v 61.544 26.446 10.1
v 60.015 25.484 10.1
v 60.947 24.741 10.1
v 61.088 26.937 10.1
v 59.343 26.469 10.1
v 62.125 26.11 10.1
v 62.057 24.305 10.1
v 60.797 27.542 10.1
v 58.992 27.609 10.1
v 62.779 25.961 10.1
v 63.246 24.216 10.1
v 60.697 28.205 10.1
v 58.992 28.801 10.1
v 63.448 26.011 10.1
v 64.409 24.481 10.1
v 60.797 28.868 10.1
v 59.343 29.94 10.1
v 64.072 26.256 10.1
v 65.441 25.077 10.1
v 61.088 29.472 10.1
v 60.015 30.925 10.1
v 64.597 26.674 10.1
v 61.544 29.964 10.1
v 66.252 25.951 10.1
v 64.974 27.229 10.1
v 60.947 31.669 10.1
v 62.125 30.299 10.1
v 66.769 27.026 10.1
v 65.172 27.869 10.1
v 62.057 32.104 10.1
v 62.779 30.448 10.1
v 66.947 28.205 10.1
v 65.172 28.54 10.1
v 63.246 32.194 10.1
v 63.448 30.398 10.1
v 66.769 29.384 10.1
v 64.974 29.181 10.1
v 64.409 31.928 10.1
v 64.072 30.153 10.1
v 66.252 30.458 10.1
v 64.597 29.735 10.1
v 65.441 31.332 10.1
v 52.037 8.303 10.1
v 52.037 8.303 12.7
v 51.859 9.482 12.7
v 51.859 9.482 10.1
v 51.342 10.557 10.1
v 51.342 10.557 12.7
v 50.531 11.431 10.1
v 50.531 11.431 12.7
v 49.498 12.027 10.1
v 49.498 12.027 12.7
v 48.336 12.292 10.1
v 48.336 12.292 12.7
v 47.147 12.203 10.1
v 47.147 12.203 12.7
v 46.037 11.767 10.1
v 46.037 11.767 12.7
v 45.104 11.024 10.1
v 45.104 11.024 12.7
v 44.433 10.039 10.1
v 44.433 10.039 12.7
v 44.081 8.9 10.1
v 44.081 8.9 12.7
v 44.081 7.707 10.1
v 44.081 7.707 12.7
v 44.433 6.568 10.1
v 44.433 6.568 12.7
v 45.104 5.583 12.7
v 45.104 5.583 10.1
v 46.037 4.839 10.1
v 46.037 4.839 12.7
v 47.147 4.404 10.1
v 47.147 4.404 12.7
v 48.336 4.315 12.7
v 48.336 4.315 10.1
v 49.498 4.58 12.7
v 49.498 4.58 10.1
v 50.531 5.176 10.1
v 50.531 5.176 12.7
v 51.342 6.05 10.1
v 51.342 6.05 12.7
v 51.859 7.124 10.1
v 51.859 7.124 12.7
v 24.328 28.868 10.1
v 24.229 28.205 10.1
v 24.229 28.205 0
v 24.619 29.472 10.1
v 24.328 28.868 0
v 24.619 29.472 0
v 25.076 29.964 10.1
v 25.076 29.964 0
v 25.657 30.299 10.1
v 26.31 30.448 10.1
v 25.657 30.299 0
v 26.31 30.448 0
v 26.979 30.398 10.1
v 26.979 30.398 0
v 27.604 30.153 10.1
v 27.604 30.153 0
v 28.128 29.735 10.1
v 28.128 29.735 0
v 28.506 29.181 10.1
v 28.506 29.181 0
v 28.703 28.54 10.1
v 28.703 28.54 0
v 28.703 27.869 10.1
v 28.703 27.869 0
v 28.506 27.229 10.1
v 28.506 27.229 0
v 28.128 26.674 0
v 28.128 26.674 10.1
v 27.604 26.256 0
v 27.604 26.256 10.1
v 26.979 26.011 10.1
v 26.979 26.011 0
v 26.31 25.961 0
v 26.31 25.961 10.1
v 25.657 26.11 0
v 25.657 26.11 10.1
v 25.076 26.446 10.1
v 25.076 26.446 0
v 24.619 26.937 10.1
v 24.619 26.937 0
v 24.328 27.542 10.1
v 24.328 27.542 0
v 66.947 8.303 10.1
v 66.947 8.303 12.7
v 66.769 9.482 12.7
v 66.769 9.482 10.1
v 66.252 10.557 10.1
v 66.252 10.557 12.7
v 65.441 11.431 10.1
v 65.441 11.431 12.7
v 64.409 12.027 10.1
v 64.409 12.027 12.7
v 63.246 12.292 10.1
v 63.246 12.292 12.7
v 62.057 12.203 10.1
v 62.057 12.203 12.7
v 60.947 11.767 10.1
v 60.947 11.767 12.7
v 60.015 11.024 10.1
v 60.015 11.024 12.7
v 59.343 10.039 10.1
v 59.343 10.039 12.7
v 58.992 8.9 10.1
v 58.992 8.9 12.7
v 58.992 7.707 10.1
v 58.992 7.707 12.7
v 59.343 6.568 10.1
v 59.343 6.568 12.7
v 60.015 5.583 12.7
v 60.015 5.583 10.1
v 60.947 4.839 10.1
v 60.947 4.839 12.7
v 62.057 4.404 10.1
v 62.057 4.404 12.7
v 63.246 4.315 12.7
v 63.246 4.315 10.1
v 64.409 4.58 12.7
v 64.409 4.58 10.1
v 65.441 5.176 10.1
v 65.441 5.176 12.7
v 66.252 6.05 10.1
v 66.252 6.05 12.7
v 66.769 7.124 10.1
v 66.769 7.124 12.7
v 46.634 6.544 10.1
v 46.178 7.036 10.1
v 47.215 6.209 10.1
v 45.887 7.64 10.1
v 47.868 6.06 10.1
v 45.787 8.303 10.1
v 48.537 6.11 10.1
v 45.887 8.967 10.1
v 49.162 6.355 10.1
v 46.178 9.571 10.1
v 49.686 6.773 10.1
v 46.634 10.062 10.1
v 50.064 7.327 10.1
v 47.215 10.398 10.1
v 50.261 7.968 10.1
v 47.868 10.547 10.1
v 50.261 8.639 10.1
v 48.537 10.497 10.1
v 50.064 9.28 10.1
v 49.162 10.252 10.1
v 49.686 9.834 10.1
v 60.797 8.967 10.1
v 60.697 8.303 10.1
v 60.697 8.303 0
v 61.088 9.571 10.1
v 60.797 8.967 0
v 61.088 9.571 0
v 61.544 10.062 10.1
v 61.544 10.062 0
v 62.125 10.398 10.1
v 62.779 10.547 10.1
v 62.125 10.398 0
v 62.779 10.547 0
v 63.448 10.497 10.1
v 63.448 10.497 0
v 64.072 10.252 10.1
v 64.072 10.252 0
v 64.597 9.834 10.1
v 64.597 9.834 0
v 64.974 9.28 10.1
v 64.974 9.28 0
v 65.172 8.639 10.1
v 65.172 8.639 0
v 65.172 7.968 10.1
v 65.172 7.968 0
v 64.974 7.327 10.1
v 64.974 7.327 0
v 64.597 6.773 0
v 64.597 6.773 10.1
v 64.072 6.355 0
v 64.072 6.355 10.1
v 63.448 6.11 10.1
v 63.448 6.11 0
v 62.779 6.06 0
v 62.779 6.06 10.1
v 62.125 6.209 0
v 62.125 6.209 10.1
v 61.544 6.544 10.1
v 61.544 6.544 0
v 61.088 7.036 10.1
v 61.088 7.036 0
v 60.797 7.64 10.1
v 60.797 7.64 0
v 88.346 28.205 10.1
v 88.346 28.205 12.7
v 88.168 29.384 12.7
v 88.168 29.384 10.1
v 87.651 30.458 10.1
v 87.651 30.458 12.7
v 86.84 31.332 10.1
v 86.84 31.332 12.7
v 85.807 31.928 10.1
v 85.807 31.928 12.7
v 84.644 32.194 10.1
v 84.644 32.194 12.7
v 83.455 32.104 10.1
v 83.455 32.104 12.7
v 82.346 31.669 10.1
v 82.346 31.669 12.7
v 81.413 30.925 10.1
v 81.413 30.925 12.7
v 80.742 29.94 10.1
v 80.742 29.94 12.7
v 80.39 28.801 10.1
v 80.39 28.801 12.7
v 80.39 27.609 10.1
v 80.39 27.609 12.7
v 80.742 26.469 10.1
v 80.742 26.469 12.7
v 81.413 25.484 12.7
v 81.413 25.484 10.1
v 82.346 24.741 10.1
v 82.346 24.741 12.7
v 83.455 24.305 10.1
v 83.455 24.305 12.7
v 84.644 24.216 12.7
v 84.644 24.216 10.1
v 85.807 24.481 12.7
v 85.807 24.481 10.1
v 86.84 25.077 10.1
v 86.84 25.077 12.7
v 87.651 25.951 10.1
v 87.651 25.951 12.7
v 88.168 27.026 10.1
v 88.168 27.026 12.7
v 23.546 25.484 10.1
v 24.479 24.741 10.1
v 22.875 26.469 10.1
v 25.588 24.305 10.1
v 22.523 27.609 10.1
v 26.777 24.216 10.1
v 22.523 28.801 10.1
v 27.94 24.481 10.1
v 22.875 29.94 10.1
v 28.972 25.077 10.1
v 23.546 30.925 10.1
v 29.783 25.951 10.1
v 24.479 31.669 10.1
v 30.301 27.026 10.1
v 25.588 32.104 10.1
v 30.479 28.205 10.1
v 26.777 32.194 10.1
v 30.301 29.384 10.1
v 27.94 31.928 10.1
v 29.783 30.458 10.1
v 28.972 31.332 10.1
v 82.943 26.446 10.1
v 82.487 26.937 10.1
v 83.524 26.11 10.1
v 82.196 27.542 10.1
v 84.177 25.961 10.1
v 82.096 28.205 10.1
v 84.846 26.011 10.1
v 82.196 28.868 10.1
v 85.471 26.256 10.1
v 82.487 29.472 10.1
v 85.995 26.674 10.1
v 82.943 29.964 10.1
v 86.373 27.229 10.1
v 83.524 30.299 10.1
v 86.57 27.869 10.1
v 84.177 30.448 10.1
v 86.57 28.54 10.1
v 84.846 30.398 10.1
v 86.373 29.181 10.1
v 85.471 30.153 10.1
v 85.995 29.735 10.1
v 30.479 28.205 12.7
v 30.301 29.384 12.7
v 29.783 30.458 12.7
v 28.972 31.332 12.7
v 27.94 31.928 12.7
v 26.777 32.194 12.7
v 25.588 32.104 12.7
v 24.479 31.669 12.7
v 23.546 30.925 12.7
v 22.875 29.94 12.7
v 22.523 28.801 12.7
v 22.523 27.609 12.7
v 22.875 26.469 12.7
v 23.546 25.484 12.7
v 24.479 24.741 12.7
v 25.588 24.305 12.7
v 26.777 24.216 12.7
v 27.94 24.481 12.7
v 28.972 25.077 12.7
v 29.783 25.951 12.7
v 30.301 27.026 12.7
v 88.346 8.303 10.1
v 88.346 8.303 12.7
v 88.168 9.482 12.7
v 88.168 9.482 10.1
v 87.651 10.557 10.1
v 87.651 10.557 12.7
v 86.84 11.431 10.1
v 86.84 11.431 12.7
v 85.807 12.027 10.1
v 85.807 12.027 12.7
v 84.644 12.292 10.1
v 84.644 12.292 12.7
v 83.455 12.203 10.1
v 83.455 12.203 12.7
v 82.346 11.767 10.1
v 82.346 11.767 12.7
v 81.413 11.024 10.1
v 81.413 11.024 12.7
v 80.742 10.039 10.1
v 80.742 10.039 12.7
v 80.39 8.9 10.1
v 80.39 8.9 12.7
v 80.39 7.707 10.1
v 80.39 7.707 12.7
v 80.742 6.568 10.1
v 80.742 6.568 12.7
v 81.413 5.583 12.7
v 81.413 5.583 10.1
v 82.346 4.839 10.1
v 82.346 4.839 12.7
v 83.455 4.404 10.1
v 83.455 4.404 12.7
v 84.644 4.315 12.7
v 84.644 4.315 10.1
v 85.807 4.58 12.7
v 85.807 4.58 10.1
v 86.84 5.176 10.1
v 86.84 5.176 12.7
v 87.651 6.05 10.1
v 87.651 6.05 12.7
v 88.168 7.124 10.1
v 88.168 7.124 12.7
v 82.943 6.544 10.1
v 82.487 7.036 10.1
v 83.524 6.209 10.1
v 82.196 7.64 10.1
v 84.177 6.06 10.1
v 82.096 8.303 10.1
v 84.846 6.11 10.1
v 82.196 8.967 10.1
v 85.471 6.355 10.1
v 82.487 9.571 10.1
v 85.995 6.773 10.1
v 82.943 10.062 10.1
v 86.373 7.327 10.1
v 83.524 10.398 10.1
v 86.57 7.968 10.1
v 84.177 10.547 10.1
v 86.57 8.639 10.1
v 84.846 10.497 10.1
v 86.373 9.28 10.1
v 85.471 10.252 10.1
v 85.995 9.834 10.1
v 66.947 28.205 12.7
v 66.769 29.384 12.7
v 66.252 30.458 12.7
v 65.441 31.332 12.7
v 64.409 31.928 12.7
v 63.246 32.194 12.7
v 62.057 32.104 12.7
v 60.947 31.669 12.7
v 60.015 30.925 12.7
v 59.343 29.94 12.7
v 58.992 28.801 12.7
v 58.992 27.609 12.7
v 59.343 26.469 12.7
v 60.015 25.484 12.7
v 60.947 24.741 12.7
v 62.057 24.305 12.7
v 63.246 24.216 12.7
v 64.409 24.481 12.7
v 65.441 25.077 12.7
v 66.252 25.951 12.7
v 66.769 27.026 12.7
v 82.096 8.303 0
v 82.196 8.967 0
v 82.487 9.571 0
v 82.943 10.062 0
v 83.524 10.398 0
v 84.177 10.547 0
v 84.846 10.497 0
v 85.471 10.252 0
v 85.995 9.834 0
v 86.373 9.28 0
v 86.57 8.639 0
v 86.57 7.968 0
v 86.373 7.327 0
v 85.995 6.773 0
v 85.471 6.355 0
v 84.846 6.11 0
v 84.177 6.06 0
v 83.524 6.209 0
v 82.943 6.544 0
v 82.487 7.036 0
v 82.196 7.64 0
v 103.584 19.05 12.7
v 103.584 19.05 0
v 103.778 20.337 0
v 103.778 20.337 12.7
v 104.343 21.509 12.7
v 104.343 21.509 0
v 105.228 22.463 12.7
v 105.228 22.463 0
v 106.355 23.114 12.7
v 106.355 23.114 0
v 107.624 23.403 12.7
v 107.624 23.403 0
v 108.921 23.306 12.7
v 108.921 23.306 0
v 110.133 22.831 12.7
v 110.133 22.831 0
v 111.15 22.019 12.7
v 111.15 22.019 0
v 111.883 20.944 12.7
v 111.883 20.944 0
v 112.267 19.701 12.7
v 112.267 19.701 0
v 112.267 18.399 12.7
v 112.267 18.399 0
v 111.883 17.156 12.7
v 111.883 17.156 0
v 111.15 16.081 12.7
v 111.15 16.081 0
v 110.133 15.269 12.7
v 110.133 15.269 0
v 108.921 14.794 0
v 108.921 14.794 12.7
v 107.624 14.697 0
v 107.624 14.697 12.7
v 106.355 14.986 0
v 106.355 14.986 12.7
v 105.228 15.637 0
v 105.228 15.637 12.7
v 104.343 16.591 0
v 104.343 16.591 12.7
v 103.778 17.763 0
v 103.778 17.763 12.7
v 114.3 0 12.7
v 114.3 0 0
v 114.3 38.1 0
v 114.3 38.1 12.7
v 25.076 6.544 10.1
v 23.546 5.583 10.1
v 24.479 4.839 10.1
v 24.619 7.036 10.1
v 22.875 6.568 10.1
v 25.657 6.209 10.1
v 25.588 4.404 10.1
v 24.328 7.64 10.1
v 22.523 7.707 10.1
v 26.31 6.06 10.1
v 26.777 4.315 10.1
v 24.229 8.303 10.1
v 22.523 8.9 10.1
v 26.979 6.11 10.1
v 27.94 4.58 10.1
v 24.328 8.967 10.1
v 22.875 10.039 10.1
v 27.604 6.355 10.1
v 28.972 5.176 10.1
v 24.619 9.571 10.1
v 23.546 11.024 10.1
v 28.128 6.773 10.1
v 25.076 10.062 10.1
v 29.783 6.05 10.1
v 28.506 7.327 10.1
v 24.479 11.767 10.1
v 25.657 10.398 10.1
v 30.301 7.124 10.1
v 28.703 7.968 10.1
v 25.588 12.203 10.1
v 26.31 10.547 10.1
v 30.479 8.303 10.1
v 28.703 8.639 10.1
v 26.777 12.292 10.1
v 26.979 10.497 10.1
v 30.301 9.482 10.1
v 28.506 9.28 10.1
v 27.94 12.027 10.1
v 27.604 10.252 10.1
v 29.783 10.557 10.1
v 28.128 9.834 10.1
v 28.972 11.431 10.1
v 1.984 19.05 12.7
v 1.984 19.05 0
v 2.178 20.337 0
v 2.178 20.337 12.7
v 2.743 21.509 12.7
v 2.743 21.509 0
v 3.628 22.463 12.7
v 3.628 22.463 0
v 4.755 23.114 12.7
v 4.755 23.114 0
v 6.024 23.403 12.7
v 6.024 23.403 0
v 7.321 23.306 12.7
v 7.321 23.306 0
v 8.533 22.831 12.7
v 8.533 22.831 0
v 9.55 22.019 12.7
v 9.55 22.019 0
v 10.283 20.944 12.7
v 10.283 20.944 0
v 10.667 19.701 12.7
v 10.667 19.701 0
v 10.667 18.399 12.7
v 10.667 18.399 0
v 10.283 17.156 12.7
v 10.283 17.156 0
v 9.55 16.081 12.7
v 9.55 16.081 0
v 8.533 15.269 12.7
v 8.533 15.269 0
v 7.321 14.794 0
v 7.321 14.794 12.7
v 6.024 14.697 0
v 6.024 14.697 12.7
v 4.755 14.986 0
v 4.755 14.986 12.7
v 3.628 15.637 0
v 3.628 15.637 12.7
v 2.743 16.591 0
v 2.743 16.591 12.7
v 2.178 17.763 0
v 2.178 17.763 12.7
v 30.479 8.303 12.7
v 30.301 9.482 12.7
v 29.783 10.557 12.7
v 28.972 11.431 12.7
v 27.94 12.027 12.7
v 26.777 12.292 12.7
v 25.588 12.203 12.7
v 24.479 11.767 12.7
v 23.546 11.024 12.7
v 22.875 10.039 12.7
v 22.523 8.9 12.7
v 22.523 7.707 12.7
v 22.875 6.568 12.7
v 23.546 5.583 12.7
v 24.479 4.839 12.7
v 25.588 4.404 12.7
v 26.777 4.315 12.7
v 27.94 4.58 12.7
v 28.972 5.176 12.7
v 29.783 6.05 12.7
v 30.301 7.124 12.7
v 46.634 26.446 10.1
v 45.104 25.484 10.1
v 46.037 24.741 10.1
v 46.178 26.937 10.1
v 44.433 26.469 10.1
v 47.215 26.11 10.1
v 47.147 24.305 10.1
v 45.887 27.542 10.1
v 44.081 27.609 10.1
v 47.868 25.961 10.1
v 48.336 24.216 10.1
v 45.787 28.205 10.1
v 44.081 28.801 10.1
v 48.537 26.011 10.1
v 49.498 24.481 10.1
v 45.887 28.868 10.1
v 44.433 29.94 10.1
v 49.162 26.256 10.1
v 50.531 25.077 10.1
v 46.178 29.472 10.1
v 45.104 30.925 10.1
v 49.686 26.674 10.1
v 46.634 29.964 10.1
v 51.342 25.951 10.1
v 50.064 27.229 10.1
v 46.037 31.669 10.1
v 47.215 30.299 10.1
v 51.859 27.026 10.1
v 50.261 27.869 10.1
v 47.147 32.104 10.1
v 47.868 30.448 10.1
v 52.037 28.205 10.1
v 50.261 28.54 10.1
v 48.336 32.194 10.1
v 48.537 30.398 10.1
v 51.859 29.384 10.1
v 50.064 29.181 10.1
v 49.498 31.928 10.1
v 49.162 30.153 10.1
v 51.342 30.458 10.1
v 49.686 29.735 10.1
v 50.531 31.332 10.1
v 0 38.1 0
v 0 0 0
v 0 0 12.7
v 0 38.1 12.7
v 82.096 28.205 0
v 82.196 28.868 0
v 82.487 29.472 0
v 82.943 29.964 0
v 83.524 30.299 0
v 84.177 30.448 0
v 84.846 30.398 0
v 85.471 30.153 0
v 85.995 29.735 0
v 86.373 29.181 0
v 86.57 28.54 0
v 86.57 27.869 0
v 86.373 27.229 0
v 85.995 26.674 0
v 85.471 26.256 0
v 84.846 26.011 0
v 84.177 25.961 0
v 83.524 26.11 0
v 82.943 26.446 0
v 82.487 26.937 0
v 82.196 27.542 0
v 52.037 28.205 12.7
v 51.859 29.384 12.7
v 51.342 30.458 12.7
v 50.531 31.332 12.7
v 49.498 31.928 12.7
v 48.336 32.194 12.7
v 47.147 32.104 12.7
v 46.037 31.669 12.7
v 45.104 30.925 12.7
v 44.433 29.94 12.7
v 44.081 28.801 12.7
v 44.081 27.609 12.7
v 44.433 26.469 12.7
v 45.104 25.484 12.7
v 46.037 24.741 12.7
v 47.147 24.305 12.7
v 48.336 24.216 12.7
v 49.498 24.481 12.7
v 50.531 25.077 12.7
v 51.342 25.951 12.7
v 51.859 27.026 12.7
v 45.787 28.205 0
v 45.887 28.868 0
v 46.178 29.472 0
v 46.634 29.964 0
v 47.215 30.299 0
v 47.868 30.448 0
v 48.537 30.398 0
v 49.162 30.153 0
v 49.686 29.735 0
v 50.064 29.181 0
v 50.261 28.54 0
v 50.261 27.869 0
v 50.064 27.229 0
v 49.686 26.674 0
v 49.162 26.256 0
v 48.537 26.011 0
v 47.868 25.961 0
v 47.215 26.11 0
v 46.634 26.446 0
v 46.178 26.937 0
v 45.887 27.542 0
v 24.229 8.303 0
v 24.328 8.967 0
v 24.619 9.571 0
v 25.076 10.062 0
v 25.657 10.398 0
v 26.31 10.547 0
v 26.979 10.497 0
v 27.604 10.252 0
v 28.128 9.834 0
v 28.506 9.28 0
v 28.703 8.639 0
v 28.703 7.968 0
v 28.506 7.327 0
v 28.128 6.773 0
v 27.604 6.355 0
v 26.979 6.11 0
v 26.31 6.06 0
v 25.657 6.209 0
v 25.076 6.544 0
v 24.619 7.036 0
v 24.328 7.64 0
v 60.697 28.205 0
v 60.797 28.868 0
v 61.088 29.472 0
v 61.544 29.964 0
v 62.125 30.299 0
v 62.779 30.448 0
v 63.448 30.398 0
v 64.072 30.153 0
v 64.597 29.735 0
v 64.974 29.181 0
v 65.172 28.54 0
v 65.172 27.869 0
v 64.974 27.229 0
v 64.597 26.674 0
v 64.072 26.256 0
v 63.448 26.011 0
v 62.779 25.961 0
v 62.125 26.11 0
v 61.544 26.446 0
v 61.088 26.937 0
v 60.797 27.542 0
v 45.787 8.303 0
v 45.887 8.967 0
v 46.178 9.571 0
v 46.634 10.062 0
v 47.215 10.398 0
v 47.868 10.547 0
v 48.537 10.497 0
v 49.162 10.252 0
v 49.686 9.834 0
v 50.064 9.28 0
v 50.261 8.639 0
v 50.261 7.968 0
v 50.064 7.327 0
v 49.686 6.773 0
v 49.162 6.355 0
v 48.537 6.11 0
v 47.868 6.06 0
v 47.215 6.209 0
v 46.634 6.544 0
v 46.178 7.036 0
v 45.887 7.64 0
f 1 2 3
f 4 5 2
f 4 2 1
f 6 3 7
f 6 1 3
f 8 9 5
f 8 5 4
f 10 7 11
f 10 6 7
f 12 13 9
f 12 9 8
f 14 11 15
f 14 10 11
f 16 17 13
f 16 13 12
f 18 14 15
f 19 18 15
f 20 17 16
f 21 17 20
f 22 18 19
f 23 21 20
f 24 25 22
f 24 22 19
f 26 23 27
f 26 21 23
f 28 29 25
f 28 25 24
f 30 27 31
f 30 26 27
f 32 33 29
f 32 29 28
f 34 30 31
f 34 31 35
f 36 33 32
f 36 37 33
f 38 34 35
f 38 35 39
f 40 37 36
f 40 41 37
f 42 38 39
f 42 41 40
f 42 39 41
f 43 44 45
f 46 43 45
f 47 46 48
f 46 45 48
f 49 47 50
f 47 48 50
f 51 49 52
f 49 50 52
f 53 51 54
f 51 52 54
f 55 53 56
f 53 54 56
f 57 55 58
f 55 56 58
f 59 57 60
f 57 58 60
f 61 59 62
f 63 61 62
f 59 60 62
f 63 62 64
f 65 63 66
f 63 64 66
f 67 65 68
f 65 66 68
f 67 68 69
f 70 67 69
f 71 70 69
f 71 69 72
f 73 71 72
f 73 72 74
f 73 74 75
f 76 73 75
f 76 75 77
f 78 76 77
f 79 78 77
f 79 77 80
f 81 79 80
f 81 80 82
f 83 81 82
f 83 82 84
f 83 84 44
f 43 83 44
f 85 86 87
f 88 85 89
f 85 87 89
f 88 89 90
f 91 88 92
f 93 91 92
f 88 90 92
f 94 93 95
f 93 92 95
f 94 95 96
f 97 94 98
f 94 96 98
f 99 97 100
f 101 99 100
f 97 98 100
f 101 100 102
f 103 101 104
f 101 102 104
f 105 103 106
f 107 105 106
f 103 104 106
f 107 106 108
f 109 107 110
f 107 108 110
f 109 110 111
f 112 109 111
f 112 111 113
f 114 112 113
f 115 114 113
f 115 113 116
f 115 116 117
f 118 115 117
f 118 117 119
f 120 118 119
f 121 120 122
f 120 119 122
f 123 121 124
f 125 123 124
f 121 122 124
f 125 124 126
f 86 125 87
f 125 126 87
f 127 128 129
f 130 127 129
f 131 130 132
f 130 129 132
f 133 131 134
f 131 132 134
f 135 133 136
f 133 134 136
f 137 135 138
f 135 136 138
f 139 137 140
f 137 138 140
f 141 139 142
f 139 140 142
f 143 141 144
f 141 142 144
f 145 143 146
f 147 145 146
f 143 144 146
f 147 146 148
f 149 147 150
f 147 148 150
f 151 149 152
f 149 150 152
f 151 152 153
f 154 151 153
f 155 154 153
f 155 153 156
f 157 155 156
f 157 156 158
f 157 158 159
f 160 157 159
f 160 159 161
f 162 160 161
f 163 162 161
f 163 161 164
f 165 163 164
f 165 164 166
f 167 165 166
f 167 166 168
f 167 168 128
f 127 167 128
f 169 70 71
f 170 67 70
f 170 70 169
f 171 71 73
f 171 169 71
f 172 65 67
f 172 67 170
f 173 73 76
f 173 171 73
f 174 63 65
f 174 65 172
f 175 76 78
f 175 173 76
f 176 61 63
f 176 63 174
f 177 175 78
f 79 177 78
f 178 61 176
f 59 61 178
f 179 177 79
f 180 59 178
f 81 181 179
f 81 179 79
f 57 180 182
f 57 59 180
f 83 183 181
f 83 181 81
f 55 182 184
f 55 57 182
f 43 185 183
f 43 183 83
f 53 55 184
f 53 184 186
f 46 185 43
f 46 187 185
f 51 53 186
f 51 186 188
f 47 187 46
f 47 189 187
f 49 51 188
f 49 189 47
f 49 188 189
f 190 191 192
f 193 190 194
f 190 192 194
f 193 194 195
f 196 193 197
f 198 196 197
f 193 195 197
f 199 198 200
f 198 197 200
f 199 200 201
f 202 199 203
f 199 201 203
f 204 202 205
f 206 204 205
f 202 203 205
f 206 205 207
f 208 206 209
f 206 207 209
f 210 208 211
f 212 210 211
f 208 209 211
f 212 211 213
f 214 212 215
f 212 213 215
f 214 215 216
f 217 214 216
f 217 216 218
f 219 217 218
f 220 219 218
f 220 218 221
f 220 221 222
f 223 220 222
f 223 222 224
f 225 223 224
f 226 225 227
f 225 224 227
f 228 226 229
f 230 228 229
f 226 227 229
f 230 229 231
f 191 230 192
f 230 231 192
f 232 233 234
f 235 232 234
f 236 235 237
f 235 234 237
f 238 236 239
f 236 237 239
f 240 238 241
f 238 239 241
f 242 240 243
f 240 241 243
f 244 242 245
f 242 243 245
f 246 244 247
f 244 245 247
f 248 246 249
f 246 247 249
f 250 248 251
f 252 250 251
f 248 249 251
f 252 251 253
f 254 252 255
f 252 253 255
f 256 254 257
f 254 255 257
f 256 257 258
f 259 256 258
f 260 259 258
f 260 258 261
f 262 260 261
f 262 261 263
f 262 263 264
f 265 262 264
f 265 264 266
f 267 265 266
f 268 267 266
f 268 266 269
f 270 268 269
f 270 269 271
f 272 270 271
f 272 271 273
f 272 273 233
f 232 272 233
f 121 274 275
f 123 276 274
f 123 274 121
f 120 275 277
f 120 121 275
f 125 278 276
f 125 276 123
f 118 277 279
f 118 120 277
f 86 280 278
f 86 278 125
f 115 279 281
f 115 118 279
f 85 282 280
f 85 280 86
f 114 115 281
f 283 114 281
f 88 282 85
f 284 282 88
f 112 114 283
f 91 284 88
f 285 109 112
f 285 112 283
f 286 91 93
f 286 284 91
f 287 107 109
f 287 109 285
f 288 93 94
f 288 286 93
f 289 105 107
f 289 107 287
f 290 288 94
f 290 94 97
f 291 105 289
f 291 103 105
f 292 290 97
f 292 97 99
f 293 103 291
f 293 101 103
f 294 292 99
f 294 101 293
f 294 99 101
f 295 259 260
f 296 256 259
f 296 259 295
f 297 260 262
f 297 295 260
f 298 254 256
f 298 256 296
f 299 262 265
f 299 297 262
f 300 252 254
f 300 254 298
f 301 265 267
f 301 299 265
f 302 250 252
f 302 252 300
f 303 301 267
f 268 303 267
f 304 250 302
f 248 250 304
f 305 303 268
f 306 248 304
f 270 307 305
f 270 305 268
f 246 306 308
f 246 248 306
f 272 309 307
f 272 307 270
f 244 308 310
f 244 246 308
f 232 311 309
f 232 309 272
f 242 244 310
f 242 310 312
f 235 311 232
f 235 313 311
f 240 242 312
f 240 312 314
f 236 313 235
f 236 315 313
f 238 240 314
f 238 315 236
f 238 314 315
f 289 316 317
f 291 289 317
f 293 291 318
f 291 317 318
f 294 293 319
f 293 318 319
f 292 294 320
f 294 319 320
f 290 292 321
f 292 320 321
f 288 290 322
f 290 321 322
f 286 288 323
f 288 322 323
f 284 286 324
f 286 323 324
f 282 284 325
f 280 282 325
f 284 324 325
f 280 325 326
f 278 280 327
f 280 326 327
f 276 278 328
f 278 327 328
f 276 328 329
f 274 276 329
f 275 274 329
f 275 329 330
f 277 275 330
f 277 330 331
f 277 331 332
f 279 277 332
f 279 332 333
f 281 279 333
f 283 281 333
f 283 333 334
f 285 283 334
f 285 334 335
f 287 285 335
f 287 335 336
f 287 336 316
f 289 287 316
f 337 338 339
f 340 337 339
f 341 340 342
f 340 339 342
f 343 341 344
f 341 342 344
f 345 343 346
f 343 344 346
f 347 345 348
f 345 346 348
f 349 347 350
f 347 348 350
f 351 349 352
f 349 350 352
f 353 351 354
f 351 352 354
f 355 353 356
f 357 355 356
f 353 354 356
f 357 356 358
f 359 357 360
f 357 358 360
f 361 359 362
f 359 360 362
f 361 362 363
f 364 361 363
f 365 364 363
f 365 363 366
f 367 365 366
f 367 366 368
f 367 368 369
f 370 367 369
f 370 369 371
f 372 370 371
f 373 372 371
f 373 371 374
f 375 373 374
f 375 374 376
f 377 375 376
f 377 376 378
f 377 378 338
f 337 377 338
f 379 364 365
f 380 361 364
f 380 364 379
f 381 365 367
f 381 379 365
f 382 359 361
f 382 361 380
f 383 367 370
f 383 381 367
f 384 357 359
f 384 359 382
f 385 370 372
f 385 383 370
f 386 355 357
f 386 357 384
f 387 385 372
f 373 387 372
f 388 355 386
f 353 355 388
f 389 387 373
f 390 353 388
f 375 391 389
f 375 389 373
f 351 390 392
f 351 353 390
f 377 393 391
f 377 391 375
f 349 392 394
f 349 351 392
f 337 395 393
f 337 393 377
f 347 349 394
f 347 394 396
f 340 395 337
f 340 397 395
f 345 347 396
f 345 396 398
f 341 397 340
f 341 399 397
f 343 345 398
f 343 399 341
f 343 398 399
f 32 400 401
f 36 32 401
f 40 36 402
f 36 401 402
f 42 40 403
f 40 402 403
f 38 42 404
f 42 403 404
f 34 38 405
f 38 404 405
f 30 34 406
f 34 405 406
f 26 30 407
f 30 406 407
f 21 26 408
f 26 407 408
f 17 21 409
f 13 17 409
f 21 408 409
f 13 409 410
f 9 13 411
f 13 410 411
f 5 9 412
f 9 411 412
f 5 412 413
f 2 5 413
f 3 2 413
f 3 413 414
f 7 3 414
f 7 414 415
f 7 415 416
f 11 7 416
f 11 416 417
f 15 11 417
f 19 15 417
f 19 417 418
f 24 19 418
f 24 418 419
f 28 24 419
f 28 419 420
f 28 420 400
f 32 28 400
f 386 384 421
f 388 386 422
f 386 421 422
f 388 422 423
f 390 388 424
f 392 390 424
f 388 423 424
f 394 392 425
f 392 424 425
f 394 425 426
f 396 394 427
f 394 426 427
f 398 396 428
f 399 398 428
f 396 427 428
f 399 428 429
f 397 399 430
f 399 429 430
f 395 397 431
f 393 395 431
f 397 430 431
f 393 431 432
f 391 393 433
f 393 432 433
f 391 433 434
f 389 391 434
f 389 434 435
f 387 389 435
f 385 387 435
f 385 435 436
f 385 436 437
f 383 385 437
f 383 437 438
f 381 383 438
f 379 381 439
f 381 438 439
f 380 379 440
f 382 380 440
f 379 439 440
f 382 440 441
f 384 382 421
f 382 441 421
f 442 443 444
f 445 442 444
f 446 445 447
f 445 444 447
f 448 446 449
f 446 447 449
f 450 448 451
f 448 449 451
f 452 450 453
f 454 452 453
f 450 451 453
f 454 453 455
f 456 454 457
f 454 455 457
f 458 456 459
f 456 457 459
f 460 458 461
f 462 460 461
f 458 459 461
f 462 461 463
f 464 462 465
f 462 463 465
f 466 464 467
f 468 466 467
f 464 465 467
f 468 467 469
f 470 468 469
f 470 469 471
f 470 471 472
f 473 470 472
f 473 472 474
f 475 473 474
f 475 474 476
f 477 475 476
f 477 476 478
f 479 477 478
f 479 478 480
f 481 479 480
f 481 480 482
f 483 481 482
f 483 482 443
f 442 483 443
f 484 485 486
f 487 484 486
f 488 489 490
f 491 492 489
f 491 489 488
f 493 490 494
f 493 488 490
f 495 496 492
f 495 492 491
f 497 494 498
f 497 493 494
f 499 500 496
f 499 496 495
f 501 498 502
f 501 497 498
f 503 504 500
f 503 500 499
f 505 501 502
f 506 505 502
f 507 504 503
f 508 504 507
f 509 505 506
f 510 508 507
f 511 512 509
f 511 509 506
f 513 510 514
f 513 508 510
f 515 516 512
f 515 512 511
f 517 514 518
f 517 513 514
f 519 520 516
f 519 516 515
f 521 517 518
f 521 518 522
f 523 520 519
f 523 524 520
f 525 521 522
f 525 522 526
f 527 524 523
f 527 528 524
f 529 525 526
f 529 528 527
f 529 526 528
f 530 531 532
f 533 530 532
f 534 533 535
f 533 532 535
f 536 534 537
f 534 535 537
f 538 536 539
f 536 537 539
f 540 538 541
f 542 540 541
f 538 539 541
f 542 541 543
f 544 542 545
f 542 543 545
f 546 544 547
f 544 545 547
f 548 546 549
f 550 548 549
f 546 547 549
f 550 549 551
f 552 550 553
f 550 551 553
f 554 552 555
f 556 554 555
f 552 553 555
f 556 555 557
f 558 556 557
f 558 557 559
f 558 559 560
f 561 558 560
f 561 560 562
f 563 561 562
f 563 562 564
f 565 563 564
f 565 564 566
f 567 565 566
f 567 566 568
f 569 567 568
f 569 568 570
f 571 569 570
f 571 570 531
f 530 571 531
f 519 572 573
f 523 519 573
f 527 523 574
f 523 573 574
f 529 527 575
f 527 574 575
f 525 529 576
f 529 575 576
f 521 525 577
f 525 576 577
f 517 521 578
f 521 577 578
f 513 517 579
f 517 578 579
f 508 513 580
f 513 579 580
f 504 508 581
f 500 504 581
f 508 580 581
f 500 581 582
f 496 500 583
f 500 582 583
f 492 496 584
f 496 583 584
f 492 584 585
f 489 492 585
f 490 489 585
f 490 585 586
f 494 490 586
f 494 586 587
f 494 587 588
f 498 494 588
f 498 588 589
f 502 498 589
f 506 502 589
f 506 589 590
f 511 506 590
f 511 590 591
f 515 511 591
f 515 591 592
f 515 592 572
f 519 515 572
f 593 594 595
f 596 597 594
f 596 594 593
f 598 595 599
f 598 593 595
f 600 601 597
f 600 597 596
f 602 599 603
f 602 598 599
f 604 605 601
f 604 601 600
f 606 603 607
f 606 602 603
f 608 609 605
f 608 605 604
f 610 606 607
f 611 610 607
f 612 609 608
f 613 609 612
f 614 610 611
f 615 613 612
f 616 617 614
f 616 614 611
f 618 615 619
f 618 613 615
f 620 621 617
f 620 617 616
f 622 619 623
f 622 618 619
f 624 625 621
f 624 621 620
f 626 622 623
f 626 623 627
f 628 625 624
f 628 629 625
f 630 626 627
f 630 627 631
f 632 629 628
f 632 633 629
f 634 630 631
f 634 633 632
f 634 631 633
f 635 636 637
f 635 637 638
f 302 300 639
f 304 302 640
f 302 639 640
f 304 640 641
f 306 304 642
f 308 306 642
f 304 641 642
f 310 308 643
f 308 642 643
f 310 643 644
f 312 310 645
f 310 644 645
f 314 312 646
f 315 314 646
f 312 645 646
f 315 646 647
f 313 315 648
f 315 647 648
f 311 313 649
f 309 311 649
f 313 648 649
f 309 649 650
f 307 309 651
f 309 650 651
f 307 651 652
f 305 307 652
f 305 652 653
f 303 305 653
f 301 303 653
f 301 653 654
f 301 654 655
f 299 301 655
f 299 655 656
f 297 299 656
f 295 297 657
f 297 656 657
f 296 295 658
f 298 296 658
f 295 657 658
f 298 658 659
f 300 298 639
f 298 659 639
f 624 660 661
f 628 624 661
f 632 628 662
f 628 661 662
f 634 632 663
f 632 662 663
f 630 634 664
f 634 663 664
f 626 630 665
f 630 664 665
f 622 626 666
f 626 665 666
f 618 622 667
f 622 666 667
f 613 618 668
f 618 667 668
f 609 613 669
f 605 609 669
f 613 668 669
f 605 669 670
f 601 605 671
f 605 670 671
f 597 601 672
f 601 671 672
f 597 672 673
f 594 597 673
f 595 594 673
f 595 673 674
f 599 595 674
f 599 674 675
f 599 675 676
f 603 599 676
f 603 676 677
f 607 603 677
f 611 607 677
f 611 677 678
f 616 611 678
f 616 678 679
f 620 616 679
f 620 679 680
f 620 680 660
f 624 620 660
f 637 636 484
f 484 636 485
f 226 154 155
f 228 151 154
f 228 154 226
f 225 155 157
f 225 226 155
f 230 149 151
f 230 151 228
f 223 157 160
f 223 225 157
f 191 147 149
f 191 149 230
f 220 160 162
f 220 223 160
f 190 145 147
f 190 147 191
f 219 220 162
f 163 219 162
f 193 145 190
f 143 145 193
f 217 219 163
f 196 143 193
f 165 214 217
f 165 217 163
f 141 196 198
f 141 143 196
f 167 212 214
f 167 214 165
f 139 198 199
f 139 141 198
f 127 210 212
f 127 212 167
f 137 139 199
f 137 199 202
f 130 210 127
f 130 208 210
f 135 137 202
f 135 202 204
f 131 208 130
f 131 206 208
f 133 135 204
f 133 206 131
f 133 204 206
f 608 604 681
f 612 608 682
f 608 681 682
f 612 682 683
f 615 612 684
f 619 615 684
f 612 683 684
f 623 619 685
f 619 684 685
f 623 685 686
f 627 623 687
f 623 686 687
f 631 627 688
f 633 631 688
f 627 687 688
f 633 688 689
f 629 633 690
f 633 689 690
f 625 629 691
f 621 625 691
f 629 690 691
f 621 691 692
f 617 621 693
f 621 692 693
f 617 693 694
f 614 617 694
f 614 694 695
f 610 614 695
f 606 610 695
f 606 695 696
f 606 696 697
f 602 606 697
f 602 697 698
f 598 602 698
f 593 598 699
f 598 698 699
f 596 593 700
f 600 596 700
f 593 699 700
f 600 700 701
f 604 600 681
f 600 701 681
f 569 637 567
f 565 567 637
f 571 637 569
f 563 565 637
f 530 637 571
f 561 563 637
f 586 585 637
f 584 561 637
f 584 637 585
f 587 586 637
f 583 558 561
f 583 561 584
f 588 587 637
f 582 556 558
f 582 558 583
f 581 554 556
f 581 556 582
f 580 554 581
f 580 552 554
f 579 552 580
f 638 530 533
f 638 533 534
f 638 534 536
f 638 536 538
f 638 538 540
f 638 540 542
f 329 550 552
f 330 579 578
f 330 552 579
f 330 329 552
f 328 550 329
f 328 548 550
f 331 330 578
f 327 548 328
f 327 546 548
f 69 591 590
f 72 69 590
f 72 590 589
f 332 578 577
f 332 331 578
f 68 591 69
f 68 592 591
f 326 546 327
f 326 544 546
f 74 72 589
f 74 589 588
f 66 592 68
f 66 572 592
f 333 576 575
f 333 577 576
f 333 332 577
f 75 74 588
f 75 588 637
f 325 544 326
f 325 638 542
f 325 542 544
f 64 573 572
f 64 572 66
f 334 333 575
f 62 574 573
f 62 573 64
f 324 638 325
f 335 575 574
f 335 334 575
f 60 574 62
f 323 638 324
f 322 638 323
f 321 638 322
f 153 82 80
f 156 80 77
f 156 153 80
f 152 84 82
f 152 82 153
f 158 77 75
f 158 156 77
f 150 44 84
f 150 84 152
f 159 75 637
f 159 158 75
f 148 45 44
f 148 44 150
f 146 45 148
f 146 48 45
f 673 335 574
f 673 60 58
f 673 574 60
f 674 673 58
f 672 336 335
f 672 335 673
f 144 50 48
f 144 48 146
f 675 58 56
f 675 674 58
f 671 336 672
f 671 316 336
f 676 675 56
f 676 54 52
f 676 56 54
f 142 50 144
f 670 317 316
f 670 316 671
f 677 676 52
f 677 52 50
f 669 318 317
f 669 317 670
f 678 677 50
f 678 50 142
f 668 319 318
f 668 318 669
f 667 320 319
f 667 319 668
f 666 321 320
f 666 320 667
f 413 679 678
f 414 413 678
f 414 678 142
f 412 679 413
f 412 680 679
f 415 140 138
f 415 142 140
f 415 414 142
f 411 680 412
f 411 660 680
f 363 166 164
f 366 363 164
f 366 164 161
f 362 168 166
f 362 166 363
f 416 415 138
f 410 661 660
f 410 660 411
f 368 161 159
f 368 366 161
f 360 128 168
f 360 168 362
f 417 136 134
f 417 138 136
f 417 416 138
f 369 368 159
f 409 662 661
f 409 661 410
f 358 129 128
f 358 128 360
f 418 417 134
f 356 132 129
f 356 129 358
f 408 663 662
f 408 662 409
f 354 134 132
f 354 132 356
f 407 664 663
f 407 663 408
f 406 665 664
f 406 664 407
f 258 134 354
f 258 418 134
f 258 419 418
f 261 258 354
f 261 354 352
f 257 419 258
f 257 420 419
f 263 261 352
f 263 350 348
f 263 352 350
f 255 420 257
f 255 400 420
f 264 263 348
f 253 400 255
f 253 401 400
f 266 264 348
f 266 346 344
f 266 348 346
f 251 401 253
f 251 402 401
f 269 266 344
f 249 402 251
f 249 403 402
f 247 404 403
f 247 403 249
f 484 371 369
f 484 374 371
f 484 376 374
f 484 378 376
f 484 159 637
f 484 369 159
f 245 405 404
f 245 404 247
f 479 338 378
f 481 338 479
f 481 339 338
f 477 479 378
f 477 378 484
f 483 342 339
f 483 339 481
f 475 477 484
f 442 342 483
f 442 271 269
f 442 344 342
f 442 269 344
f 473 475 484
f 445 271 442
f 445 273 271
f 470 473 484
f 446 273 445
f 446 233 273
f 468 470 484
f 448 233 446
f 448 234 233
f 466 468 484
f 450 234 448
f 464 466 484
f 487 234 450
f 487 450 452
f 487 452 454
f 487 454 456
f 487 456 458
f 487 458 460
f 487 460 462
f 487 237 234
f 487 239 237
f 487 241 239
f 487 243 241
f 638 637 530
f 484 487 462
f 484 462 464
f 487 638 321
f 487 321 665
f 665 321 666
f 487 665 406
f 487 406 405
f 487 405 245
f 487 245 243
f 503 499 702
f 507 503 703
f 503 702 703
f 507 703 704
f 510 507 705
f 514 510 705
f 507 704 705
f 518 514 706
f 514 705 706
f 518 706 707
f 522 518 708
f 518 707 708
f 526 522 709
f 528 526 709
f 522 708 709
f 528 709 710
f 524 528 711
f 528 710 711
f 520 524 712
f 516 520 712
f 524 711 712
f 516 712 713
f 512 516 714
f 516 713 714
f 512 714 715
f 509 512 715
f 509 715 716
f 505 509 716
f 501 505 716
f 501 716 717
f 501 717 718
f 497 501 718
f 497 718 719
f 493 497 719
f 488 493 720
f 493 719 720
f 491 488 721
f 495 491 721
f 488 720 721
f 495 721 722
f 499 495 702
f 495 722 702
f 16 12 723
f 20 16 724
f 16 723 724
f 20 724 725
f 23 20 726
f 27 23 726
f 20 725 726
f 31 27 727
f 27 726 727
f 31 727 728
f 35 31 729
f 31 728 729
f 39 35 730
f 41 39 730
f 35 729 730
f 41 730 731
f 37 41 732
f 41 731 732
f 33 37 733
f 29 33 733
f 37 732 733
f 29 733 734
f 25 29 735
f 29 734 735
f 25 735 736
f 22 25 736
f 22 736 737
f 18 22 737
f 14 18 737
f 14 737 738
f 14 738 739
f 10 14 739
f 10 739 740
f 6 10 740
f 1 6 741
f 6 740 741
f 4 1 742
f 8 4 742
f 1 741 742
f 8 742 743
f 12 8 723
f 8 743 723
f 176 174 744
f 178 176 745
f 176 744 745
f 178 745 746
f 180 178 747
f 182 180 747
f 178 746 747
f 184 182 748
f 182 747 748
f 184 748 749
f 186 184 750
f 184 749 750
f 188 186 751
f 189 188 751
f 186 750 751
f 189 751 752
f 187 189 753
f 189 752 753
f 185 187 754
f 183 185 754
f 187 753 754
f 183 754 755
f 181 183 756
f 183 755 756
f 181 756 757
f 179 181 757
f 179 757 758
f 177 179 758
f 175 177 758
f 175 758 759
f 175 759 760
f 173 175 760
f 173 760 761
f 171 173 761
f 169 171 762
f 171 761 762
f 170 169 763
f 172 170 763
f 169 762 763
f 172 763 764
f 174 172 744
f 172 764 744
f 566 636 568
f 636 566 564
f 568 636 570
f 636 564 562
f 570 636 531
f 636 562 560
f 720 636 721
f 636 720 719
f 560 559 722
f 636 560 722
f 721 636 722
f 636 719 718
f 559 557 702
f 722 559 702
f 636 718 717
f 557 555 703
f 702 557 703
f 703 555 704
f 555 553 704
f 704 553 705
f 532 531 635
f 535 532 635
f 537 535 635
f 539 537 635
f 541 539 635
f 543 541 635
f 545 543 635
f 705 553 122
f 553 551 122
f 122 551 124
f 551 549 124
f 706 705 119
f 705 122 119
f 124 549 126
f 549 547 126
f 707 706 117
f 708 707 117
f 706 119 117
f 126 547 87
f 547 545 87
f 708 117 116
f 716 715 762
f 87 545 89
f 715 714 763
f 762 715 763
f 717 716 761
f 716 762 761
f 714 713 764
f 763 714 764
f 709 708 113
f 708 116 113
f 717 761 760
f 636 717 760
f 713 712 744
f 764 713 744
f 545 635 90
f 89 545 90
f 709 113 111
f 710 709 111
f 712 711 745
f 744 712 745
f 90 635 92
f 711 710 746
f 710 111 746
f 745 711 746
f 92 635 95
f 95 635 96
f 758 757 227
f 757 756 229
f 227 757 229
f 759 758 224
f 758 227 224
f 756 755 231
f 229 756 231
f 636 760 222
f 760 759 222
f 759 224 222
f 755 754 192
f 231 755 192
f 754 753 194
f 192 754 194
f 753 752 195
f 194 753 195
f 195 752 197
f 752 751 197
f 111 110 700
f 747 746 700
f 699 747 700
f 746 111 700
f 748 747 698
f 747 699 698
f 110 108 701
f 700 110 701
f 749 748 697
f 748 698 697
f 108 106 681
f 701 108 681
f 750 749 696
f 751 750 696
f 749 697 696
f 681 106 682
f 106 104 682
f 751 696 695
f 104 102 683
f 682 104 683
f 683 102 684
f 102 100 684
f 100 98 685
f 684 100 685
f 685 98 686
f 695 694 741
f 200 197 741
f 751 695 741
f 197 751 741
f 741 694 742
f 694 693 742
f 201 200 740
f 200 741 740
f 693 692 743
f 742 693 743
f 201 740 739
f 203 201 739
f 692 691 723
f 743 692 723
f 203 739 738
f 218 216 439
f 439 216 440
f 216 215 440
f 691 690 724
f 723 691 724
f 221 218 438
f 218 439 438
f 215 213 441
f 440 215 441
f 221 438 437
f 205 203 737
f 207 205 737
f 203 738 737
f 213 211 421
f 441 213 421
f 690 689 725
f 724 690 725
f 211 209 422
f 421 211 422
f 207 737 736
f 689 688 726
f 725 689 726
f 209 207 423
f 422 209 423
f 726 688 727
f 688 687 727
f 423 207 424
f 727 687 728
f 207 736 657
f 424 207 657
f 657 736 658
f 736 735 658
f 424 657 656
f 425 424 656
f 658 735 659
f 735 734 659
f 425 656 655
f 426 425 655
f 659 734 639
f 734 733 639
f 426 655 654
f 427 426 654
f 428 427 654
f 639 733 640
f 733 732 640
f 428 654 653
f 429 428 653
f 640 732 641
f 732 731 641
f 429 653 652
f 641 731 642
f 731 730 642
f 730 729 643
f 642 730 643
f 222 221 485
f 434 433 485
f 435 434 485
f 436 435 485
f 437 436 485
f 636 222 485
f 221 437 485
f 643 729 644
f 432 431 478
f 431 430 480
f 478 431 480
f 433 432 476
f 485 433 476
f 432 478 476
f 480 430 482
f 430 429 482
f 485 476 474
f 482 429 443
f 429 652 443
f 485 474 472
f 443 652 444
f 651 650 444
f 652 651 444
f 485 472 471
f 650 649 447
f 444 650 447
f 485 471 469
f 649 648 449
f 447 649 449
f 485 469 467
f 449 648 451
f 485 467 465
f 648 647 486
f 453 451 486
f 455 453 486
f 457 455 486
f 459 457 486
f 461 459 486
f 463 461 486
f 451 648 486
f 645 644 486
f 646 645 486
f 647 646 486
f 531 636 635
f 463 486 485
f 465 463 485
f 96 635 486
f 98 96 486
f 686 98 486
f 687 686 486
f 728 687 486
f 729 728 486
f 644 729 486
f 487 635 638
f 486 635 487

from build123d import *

# Parameters (mm, degrees)
SKETCH1_W                                   = 114.3
SKETCH1_H                                   = 38.1
BOSS_EXTRUDE1_DEPTH                         = 12.7
CBORE_FOR_M4_CHEESE_HEAD_SCREW2_D           = 4.5
CBORE_FOR_M4_CHEESE_HEAD_SCREW2_DEPTH       = 43.18
CBORE_FOR_M4_CHEESE_HEAD_SCREW2_CBORE_D     = 8
CBORE_FOR_M4_CHEESE_HEAD_SCREW2_CBORE_DEPTH = 2.6
CBORE_FOR_M4_CHEESE_HEAD_SCREW2_TIP         = 1.351936393
F_11_32_0_34375_DIAMETER_HOLE1_D            = 8.73125
F_11_32_0_34375_DIAMETER_HOLE1_ON_FACE_2_D  = 8.73125


with BuildPart() as part:
    # Sketch1 → Boss-Extrude1 (new body)
    with BuildSketch(Plane.XY):
        with Locations((57.15, 19.05)):
            Rectangle(SKETCH1_W, SKETCH1_H)
    extrude(amount=BOSS_EXTRUDE1_DEPTH)

    # CBORE for M4 Cheese Head Screw2
    with Locations(Plane(origin=(26.478537206, 28.204773482, 12.7), x_dir=(1, 0, 0), z_dir=(0, 0, 1))):
        with Locations((0, 0), (21.558092234, 0), (36.468605638, 0), (57.867021711, 0), (57.867021711, -19.901433884), (36.468605638, -19.901433884), (21.558092234, -19.901433884), (0, -19.901433884)):
            CounterBoreHole(CBORE_FOR_M4_CHEESE_HEAD_SCREW2_D / 2, CBORE_FOR_M4_CHEESE_HEAD_SCREW2_CBORE_D / 2, CBORE_FOR_M4_CHEESE_HEAD_SCREW2_CBORE_DEPTH, depth=CBORE_FOR_M4_CHEESE_HEAD_SCREW2_DEPTH)
            with Locations((0, 0, -(CBORE_FOR_M4_CHEESE_HEAD_SCREW2_DEPTH + CBORE_FOR_M4_CHEESE_HEAD_SCREW2_TIP / 2))):  # 118° drill point
                Cone(0, CBORE_FOR_M4_CHEESE_HEAD_SCREW2_D / 2, CBORE_FOR_M4_CHEESE_HEAD_SCREW2_TIP, mode=Mode.SUBTRACT)

    # 11/32 (0.34375) Diameter Hole1 (through all)
    with Locations(Plane(origin=(6.35, 19.05, 12.7), x_dir=(1, 0, 0), z_dir=(0, 0, 1))):
        with Locations((0, 0), (101.6, 0)):
            Hole(F_11_32_0_34375_DIAMETER_HOLE1_D / 2)

    # 11/32 (0.34375) Diameter Hole1 on face 2 (through all)
    with Locations(Plane(origin=(46.203135817, 61.386657337, 0), x_dir=(1, 0, 0), z_dir=(0, 0, 1))):
        with Locations((0, 0)):
            Hole(F_11_32_0_34375_DIAMETER_HOLE1_ON_FACE_2_D / 2)


solid = part.part
